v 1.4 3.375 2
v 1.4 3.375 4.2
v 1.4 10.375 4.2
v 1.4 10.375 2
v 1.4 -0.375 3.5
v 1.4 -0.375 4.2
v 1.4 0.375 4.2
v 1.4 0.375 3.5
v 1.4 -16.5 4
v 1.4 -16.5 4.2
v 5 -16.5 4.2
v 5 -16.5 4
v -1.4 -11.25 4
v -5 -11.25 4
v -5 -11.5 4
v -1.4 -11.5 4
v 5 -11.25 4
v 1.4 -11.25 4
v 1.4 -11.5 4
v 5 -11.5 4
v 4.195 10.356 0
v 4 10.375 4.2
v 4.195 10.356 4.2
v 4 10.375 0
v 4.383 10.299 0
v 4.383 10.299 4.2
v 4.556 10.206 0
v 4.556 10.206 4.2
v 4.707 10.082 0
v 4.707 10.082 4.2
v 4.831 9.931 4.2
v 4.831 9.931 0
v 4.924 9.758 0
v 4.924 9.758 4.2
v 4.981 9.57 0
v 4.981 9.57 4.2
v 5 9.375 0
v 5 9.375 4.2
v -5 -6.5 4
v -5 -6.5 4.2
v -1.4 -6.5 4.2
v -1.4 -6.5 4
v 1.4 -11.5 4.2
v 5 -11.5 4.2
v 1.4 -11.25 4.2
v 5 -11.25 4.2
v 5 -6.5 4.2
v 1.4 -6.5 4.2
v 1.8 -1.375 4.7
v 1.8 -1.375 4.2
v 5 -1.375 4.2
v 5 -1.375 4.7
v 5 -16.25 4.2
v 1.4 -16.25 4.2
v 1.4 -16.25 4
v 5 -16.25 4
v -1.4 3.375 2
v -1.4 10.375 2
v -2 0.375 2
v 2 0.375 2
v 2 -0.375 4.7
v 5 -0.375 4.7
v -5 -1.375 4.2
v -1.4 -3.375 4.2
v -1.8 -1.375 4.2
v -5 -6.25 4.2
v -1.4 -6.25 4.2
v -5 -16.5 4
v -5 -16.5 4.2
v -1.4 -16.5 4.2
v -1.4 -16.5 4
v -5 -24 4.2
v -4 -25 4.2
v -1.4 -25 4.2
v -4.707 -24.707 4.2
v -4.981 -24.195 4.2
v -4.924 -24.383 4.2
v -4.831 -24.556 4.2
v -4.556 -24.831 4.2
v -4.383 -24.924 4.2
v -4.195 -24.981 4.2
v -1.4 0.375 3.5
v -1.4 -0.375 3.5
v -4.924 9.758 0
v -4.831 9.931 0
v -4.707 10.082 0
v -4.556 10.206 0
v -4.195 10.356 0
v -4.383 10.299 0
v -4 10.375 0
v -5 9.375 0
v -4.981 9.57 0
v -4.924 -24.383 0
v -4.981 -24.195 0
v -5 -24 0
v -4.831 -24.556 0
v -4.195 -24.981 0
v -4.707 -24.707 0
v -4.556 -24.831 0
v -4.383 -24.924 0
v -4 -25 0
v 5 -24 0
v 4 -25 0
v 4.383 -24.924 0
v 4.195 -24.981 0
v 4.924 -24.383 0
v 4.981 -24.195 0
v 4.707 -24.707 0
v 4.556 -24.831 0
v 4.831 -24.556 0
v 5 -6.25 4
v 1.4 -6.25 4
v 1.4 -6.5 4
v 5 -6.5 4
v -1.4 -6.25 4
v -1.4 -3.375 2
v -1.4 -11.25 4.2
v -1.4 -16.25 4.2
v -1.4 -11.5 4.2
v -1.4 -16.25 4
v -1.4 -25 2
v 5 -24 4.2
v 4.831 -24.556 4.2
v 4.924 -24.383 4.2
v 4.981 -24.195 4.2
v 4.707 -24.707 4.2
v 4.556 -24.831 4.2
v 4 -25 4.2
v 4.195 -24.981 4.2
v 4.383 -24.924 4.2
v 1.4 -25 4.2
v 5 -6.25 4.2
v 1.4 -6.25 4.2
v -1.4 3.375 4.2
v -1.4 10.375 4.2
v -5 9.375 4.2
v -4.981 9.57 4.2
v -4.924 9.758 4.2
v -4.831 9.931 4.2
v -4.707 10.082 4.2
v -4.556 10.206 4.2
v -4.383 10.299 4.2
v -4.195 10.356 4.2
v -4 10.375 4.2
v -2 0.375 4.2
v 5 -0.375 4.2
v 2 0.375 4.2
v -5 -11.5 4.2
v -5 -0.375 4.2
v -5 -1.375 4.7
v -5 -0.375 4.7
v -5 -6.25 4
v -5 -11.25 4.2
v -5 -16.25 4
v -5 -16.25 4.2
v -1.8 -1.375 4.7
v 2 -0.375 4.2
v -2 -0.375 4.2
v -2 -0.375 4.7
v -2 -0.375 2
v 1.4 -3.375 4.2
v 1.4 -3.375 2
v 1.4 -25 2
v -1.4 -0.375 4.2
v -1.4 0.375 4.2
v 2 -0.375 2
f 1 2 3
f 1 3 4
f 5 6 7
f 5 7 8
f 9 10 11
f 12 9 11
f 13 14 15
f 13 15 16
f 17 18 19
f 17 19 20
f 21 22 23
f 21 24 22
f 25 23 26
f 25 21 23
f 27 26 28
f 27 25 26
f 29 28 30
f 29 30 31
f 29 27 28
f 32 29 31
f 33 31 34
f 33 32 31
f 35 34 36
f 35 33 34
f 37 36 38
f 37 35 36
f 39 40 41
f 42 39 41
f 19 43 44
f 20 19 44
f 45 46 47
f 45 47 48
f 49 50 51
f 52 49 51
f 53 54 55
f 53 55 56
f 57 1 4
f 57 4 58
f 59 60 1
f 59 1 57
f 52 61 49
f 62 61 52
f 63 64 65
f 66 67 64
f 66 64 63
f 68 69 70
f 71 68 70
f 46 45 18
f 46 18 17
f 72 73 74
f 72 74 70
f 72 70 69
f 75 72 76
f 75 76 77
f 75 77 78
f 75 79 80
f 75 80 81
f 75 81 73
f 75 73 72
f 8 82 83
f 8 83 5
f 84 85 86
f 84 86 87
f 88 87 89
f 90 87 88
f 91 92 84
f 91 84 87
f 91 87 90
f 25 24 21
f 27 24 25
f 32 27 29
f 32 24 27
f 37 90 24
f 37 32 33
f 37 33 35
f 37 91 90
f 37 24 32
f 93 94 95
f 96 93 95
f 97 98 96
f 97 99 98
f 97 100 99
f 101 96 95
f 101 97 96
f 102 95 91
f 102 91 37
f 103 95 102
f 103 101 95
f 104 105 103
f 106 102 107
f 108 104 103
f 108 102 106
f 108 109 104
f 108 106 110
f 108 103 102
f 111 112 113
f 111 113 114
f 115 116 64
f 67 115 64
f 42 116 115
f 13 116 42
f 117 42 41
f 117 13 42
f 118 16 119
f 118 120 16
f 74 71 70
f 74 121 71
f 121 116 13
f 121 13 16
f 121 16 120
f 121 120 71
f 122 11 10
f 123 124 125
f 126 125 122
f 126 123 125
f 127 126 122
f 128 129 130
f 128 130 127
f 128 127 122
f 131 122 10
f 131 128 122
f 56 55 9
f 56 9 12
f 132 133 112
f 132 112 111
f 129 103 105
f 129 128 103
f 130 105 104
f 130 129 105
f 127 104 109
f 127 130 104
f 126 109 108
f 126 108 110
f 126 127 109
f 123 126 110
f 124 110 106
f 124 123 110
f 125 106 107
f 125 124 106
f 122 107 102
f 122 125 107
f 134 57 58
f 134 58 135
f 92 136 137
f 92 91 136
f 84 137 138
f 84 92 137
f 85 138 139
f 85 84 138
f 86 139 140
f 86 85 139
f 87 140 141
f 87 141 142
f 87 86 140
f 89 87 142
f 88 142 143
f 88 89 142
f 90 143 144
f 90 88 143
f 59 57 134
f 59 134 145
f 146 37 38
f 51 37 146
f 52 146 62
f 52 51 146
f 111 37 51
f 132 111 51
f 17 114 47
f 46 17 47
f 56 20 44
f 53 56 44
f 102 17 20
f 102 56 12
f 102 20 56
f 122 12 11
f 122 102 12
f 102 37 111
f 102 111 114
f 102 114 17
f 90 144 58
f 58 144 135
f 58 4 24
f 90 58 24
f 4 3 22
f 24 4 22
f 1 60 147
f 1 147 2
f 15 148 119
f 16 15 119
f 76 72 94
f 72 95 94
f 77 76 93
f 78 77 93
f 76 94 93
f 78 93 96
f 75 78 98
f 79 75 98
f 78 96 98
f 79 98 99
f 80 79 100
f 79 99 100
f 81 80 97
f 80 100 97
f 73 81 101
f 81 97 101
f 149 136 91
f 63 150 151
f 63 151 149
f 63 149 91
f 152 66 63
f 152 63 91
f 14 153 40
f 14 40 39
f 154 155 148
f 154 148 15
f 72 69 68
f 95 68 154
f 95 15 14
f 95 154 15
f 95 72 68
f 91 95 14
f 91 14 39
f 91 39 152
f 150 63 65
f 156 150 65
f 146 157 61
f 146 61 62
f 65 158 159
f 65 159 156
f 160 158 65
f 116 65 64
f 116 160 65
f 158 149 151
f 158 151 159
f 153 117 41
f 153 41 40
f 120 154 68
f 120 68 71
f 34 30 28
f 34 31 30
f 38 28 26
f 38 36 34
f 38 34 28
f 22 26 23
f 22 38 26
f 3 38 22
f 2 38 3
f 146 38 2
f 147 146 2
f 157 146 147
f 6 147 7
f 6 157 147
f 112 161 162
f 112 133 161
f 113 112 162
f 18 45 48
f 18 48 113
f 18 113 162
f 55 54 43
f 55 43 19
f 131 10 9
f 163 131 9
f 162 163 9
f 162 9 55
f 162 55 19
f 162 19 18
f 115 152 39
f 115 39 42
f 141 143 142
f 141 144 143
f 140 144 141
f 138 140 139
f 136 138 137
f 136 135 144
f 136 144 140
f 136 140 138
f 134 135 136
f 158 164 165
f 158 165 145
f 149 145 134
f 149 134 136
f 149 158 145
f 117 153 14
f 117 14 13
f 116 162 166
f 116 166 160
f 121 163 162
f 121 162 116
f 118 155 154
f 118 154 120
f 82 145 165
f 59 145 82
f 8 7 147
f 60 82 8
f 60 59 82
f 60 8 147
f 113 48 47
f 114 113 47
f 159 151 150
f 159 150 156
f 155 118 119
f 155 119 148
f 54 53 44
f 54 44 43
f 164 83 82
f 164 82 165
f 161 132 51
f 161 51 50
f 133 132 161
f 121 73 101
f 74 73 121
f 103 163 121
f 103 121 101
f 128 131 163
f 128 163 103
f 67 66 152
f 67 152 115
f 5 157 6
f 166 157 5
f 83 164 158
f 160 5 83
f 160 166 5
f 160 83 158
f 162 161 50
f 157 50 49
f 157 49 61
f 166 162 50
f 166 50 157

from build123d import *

# Parameters (mm, degrees)
F1_DEPTH  = 25
F2_W      = 2.8
F2_H      = 0.75
F3_DEPTH  = 1.5
F4_W      = 3.6
F4_H      = 1
F5_DEPTH  = 0.5
F6_W      = 10
F6_H      = 0.25
F7_DEPTH  = 0.2
F8_W      = 10
F8_H      = 14.625
F9_DEPTH  = 4.201
F10_R     = 1
F12_DEPTH = 2.701


with BuildPart() as f1:
    # F0 (on Front) → F1 (new body, symmetric)
    with BuildSketch(Plane.XZ):
        Polygon((-5, 4.2), (-5, 0), (5, 0), (5, 4.2), (1.4, 4.2), (1.4, 2), (-1.4, 2), (-1.4, 4.2), align=None)
    extrude(amount=F1_DEPTH, both=True)

    # F2 (on face) → F3 (join)
    with BuildSketch(Plane.XY.offset(2)):
        Rectangle(F2_W, F2_H)
    extrude(amount=F3_DEPTH)

    # F4 (on face) → F5 (join)
    with BuildSketch(Plane.XY.offset(4.2)):
        with Locations((3.2, -0.875)):
            Rectangle(F4_W, F4_H)
        with Locations((-3.2, -0.875)):
            Rectangle(F4_W, F4_H)
    extrude(amount=F5_DEPTH)

    # F6 (on face) → F7 (cut)
    with BuildSketch(Plane.XY.offset(4.2)):
        with Locations((0, -6.375)):
            Rectangle(F6_W, F6_H)
        with Locations((0, -11.375)):
            Rectangle(F6_W, F6_H)
        with Locations((0, -16.375)):
            Rectangle(F6_W, F6_H)
    extrude(amount=-F7_DEPTH, mode=Mode.SUBTRACT)

    # F8 (on face) → F9 (cut, through all)
    with BuildSketch(Plane.XY.offset(4.2)):
        with Locations((0, 17.6875)):
            Rectangle(F8_W, F8_H)
    extrude(amount=-F9_DEPTH, mode=Mode.SUBTRACT)

    # F10
    f10_edges = [f1.edges().sort_by_distance(p)[0] for p in [
        (-5, 10.375, 2.1),
        (5, 10.375, 2.1),
        (-5, -25, 2.1),
        (5, -25, 2.1),
    ]]
    fillet(f10_edges, radius=F10_R)

    # F11 (on face) → F12 (cut, through all)
    with BuildSketch(Plane.XY.offset(2)):
        Polygon((2, -0.375), (-2, -0.375), (-1.4, -3.375), (1.4, -3.375), align=None)
        Polygon((-1.4, 3.375), (-2, 0.375), (2, 0.375), (1.4, 3.375), align=None)
    extrude(amount=F12_DEPTH, mode=Mode.SUBTRACT)


solid = f1.part
